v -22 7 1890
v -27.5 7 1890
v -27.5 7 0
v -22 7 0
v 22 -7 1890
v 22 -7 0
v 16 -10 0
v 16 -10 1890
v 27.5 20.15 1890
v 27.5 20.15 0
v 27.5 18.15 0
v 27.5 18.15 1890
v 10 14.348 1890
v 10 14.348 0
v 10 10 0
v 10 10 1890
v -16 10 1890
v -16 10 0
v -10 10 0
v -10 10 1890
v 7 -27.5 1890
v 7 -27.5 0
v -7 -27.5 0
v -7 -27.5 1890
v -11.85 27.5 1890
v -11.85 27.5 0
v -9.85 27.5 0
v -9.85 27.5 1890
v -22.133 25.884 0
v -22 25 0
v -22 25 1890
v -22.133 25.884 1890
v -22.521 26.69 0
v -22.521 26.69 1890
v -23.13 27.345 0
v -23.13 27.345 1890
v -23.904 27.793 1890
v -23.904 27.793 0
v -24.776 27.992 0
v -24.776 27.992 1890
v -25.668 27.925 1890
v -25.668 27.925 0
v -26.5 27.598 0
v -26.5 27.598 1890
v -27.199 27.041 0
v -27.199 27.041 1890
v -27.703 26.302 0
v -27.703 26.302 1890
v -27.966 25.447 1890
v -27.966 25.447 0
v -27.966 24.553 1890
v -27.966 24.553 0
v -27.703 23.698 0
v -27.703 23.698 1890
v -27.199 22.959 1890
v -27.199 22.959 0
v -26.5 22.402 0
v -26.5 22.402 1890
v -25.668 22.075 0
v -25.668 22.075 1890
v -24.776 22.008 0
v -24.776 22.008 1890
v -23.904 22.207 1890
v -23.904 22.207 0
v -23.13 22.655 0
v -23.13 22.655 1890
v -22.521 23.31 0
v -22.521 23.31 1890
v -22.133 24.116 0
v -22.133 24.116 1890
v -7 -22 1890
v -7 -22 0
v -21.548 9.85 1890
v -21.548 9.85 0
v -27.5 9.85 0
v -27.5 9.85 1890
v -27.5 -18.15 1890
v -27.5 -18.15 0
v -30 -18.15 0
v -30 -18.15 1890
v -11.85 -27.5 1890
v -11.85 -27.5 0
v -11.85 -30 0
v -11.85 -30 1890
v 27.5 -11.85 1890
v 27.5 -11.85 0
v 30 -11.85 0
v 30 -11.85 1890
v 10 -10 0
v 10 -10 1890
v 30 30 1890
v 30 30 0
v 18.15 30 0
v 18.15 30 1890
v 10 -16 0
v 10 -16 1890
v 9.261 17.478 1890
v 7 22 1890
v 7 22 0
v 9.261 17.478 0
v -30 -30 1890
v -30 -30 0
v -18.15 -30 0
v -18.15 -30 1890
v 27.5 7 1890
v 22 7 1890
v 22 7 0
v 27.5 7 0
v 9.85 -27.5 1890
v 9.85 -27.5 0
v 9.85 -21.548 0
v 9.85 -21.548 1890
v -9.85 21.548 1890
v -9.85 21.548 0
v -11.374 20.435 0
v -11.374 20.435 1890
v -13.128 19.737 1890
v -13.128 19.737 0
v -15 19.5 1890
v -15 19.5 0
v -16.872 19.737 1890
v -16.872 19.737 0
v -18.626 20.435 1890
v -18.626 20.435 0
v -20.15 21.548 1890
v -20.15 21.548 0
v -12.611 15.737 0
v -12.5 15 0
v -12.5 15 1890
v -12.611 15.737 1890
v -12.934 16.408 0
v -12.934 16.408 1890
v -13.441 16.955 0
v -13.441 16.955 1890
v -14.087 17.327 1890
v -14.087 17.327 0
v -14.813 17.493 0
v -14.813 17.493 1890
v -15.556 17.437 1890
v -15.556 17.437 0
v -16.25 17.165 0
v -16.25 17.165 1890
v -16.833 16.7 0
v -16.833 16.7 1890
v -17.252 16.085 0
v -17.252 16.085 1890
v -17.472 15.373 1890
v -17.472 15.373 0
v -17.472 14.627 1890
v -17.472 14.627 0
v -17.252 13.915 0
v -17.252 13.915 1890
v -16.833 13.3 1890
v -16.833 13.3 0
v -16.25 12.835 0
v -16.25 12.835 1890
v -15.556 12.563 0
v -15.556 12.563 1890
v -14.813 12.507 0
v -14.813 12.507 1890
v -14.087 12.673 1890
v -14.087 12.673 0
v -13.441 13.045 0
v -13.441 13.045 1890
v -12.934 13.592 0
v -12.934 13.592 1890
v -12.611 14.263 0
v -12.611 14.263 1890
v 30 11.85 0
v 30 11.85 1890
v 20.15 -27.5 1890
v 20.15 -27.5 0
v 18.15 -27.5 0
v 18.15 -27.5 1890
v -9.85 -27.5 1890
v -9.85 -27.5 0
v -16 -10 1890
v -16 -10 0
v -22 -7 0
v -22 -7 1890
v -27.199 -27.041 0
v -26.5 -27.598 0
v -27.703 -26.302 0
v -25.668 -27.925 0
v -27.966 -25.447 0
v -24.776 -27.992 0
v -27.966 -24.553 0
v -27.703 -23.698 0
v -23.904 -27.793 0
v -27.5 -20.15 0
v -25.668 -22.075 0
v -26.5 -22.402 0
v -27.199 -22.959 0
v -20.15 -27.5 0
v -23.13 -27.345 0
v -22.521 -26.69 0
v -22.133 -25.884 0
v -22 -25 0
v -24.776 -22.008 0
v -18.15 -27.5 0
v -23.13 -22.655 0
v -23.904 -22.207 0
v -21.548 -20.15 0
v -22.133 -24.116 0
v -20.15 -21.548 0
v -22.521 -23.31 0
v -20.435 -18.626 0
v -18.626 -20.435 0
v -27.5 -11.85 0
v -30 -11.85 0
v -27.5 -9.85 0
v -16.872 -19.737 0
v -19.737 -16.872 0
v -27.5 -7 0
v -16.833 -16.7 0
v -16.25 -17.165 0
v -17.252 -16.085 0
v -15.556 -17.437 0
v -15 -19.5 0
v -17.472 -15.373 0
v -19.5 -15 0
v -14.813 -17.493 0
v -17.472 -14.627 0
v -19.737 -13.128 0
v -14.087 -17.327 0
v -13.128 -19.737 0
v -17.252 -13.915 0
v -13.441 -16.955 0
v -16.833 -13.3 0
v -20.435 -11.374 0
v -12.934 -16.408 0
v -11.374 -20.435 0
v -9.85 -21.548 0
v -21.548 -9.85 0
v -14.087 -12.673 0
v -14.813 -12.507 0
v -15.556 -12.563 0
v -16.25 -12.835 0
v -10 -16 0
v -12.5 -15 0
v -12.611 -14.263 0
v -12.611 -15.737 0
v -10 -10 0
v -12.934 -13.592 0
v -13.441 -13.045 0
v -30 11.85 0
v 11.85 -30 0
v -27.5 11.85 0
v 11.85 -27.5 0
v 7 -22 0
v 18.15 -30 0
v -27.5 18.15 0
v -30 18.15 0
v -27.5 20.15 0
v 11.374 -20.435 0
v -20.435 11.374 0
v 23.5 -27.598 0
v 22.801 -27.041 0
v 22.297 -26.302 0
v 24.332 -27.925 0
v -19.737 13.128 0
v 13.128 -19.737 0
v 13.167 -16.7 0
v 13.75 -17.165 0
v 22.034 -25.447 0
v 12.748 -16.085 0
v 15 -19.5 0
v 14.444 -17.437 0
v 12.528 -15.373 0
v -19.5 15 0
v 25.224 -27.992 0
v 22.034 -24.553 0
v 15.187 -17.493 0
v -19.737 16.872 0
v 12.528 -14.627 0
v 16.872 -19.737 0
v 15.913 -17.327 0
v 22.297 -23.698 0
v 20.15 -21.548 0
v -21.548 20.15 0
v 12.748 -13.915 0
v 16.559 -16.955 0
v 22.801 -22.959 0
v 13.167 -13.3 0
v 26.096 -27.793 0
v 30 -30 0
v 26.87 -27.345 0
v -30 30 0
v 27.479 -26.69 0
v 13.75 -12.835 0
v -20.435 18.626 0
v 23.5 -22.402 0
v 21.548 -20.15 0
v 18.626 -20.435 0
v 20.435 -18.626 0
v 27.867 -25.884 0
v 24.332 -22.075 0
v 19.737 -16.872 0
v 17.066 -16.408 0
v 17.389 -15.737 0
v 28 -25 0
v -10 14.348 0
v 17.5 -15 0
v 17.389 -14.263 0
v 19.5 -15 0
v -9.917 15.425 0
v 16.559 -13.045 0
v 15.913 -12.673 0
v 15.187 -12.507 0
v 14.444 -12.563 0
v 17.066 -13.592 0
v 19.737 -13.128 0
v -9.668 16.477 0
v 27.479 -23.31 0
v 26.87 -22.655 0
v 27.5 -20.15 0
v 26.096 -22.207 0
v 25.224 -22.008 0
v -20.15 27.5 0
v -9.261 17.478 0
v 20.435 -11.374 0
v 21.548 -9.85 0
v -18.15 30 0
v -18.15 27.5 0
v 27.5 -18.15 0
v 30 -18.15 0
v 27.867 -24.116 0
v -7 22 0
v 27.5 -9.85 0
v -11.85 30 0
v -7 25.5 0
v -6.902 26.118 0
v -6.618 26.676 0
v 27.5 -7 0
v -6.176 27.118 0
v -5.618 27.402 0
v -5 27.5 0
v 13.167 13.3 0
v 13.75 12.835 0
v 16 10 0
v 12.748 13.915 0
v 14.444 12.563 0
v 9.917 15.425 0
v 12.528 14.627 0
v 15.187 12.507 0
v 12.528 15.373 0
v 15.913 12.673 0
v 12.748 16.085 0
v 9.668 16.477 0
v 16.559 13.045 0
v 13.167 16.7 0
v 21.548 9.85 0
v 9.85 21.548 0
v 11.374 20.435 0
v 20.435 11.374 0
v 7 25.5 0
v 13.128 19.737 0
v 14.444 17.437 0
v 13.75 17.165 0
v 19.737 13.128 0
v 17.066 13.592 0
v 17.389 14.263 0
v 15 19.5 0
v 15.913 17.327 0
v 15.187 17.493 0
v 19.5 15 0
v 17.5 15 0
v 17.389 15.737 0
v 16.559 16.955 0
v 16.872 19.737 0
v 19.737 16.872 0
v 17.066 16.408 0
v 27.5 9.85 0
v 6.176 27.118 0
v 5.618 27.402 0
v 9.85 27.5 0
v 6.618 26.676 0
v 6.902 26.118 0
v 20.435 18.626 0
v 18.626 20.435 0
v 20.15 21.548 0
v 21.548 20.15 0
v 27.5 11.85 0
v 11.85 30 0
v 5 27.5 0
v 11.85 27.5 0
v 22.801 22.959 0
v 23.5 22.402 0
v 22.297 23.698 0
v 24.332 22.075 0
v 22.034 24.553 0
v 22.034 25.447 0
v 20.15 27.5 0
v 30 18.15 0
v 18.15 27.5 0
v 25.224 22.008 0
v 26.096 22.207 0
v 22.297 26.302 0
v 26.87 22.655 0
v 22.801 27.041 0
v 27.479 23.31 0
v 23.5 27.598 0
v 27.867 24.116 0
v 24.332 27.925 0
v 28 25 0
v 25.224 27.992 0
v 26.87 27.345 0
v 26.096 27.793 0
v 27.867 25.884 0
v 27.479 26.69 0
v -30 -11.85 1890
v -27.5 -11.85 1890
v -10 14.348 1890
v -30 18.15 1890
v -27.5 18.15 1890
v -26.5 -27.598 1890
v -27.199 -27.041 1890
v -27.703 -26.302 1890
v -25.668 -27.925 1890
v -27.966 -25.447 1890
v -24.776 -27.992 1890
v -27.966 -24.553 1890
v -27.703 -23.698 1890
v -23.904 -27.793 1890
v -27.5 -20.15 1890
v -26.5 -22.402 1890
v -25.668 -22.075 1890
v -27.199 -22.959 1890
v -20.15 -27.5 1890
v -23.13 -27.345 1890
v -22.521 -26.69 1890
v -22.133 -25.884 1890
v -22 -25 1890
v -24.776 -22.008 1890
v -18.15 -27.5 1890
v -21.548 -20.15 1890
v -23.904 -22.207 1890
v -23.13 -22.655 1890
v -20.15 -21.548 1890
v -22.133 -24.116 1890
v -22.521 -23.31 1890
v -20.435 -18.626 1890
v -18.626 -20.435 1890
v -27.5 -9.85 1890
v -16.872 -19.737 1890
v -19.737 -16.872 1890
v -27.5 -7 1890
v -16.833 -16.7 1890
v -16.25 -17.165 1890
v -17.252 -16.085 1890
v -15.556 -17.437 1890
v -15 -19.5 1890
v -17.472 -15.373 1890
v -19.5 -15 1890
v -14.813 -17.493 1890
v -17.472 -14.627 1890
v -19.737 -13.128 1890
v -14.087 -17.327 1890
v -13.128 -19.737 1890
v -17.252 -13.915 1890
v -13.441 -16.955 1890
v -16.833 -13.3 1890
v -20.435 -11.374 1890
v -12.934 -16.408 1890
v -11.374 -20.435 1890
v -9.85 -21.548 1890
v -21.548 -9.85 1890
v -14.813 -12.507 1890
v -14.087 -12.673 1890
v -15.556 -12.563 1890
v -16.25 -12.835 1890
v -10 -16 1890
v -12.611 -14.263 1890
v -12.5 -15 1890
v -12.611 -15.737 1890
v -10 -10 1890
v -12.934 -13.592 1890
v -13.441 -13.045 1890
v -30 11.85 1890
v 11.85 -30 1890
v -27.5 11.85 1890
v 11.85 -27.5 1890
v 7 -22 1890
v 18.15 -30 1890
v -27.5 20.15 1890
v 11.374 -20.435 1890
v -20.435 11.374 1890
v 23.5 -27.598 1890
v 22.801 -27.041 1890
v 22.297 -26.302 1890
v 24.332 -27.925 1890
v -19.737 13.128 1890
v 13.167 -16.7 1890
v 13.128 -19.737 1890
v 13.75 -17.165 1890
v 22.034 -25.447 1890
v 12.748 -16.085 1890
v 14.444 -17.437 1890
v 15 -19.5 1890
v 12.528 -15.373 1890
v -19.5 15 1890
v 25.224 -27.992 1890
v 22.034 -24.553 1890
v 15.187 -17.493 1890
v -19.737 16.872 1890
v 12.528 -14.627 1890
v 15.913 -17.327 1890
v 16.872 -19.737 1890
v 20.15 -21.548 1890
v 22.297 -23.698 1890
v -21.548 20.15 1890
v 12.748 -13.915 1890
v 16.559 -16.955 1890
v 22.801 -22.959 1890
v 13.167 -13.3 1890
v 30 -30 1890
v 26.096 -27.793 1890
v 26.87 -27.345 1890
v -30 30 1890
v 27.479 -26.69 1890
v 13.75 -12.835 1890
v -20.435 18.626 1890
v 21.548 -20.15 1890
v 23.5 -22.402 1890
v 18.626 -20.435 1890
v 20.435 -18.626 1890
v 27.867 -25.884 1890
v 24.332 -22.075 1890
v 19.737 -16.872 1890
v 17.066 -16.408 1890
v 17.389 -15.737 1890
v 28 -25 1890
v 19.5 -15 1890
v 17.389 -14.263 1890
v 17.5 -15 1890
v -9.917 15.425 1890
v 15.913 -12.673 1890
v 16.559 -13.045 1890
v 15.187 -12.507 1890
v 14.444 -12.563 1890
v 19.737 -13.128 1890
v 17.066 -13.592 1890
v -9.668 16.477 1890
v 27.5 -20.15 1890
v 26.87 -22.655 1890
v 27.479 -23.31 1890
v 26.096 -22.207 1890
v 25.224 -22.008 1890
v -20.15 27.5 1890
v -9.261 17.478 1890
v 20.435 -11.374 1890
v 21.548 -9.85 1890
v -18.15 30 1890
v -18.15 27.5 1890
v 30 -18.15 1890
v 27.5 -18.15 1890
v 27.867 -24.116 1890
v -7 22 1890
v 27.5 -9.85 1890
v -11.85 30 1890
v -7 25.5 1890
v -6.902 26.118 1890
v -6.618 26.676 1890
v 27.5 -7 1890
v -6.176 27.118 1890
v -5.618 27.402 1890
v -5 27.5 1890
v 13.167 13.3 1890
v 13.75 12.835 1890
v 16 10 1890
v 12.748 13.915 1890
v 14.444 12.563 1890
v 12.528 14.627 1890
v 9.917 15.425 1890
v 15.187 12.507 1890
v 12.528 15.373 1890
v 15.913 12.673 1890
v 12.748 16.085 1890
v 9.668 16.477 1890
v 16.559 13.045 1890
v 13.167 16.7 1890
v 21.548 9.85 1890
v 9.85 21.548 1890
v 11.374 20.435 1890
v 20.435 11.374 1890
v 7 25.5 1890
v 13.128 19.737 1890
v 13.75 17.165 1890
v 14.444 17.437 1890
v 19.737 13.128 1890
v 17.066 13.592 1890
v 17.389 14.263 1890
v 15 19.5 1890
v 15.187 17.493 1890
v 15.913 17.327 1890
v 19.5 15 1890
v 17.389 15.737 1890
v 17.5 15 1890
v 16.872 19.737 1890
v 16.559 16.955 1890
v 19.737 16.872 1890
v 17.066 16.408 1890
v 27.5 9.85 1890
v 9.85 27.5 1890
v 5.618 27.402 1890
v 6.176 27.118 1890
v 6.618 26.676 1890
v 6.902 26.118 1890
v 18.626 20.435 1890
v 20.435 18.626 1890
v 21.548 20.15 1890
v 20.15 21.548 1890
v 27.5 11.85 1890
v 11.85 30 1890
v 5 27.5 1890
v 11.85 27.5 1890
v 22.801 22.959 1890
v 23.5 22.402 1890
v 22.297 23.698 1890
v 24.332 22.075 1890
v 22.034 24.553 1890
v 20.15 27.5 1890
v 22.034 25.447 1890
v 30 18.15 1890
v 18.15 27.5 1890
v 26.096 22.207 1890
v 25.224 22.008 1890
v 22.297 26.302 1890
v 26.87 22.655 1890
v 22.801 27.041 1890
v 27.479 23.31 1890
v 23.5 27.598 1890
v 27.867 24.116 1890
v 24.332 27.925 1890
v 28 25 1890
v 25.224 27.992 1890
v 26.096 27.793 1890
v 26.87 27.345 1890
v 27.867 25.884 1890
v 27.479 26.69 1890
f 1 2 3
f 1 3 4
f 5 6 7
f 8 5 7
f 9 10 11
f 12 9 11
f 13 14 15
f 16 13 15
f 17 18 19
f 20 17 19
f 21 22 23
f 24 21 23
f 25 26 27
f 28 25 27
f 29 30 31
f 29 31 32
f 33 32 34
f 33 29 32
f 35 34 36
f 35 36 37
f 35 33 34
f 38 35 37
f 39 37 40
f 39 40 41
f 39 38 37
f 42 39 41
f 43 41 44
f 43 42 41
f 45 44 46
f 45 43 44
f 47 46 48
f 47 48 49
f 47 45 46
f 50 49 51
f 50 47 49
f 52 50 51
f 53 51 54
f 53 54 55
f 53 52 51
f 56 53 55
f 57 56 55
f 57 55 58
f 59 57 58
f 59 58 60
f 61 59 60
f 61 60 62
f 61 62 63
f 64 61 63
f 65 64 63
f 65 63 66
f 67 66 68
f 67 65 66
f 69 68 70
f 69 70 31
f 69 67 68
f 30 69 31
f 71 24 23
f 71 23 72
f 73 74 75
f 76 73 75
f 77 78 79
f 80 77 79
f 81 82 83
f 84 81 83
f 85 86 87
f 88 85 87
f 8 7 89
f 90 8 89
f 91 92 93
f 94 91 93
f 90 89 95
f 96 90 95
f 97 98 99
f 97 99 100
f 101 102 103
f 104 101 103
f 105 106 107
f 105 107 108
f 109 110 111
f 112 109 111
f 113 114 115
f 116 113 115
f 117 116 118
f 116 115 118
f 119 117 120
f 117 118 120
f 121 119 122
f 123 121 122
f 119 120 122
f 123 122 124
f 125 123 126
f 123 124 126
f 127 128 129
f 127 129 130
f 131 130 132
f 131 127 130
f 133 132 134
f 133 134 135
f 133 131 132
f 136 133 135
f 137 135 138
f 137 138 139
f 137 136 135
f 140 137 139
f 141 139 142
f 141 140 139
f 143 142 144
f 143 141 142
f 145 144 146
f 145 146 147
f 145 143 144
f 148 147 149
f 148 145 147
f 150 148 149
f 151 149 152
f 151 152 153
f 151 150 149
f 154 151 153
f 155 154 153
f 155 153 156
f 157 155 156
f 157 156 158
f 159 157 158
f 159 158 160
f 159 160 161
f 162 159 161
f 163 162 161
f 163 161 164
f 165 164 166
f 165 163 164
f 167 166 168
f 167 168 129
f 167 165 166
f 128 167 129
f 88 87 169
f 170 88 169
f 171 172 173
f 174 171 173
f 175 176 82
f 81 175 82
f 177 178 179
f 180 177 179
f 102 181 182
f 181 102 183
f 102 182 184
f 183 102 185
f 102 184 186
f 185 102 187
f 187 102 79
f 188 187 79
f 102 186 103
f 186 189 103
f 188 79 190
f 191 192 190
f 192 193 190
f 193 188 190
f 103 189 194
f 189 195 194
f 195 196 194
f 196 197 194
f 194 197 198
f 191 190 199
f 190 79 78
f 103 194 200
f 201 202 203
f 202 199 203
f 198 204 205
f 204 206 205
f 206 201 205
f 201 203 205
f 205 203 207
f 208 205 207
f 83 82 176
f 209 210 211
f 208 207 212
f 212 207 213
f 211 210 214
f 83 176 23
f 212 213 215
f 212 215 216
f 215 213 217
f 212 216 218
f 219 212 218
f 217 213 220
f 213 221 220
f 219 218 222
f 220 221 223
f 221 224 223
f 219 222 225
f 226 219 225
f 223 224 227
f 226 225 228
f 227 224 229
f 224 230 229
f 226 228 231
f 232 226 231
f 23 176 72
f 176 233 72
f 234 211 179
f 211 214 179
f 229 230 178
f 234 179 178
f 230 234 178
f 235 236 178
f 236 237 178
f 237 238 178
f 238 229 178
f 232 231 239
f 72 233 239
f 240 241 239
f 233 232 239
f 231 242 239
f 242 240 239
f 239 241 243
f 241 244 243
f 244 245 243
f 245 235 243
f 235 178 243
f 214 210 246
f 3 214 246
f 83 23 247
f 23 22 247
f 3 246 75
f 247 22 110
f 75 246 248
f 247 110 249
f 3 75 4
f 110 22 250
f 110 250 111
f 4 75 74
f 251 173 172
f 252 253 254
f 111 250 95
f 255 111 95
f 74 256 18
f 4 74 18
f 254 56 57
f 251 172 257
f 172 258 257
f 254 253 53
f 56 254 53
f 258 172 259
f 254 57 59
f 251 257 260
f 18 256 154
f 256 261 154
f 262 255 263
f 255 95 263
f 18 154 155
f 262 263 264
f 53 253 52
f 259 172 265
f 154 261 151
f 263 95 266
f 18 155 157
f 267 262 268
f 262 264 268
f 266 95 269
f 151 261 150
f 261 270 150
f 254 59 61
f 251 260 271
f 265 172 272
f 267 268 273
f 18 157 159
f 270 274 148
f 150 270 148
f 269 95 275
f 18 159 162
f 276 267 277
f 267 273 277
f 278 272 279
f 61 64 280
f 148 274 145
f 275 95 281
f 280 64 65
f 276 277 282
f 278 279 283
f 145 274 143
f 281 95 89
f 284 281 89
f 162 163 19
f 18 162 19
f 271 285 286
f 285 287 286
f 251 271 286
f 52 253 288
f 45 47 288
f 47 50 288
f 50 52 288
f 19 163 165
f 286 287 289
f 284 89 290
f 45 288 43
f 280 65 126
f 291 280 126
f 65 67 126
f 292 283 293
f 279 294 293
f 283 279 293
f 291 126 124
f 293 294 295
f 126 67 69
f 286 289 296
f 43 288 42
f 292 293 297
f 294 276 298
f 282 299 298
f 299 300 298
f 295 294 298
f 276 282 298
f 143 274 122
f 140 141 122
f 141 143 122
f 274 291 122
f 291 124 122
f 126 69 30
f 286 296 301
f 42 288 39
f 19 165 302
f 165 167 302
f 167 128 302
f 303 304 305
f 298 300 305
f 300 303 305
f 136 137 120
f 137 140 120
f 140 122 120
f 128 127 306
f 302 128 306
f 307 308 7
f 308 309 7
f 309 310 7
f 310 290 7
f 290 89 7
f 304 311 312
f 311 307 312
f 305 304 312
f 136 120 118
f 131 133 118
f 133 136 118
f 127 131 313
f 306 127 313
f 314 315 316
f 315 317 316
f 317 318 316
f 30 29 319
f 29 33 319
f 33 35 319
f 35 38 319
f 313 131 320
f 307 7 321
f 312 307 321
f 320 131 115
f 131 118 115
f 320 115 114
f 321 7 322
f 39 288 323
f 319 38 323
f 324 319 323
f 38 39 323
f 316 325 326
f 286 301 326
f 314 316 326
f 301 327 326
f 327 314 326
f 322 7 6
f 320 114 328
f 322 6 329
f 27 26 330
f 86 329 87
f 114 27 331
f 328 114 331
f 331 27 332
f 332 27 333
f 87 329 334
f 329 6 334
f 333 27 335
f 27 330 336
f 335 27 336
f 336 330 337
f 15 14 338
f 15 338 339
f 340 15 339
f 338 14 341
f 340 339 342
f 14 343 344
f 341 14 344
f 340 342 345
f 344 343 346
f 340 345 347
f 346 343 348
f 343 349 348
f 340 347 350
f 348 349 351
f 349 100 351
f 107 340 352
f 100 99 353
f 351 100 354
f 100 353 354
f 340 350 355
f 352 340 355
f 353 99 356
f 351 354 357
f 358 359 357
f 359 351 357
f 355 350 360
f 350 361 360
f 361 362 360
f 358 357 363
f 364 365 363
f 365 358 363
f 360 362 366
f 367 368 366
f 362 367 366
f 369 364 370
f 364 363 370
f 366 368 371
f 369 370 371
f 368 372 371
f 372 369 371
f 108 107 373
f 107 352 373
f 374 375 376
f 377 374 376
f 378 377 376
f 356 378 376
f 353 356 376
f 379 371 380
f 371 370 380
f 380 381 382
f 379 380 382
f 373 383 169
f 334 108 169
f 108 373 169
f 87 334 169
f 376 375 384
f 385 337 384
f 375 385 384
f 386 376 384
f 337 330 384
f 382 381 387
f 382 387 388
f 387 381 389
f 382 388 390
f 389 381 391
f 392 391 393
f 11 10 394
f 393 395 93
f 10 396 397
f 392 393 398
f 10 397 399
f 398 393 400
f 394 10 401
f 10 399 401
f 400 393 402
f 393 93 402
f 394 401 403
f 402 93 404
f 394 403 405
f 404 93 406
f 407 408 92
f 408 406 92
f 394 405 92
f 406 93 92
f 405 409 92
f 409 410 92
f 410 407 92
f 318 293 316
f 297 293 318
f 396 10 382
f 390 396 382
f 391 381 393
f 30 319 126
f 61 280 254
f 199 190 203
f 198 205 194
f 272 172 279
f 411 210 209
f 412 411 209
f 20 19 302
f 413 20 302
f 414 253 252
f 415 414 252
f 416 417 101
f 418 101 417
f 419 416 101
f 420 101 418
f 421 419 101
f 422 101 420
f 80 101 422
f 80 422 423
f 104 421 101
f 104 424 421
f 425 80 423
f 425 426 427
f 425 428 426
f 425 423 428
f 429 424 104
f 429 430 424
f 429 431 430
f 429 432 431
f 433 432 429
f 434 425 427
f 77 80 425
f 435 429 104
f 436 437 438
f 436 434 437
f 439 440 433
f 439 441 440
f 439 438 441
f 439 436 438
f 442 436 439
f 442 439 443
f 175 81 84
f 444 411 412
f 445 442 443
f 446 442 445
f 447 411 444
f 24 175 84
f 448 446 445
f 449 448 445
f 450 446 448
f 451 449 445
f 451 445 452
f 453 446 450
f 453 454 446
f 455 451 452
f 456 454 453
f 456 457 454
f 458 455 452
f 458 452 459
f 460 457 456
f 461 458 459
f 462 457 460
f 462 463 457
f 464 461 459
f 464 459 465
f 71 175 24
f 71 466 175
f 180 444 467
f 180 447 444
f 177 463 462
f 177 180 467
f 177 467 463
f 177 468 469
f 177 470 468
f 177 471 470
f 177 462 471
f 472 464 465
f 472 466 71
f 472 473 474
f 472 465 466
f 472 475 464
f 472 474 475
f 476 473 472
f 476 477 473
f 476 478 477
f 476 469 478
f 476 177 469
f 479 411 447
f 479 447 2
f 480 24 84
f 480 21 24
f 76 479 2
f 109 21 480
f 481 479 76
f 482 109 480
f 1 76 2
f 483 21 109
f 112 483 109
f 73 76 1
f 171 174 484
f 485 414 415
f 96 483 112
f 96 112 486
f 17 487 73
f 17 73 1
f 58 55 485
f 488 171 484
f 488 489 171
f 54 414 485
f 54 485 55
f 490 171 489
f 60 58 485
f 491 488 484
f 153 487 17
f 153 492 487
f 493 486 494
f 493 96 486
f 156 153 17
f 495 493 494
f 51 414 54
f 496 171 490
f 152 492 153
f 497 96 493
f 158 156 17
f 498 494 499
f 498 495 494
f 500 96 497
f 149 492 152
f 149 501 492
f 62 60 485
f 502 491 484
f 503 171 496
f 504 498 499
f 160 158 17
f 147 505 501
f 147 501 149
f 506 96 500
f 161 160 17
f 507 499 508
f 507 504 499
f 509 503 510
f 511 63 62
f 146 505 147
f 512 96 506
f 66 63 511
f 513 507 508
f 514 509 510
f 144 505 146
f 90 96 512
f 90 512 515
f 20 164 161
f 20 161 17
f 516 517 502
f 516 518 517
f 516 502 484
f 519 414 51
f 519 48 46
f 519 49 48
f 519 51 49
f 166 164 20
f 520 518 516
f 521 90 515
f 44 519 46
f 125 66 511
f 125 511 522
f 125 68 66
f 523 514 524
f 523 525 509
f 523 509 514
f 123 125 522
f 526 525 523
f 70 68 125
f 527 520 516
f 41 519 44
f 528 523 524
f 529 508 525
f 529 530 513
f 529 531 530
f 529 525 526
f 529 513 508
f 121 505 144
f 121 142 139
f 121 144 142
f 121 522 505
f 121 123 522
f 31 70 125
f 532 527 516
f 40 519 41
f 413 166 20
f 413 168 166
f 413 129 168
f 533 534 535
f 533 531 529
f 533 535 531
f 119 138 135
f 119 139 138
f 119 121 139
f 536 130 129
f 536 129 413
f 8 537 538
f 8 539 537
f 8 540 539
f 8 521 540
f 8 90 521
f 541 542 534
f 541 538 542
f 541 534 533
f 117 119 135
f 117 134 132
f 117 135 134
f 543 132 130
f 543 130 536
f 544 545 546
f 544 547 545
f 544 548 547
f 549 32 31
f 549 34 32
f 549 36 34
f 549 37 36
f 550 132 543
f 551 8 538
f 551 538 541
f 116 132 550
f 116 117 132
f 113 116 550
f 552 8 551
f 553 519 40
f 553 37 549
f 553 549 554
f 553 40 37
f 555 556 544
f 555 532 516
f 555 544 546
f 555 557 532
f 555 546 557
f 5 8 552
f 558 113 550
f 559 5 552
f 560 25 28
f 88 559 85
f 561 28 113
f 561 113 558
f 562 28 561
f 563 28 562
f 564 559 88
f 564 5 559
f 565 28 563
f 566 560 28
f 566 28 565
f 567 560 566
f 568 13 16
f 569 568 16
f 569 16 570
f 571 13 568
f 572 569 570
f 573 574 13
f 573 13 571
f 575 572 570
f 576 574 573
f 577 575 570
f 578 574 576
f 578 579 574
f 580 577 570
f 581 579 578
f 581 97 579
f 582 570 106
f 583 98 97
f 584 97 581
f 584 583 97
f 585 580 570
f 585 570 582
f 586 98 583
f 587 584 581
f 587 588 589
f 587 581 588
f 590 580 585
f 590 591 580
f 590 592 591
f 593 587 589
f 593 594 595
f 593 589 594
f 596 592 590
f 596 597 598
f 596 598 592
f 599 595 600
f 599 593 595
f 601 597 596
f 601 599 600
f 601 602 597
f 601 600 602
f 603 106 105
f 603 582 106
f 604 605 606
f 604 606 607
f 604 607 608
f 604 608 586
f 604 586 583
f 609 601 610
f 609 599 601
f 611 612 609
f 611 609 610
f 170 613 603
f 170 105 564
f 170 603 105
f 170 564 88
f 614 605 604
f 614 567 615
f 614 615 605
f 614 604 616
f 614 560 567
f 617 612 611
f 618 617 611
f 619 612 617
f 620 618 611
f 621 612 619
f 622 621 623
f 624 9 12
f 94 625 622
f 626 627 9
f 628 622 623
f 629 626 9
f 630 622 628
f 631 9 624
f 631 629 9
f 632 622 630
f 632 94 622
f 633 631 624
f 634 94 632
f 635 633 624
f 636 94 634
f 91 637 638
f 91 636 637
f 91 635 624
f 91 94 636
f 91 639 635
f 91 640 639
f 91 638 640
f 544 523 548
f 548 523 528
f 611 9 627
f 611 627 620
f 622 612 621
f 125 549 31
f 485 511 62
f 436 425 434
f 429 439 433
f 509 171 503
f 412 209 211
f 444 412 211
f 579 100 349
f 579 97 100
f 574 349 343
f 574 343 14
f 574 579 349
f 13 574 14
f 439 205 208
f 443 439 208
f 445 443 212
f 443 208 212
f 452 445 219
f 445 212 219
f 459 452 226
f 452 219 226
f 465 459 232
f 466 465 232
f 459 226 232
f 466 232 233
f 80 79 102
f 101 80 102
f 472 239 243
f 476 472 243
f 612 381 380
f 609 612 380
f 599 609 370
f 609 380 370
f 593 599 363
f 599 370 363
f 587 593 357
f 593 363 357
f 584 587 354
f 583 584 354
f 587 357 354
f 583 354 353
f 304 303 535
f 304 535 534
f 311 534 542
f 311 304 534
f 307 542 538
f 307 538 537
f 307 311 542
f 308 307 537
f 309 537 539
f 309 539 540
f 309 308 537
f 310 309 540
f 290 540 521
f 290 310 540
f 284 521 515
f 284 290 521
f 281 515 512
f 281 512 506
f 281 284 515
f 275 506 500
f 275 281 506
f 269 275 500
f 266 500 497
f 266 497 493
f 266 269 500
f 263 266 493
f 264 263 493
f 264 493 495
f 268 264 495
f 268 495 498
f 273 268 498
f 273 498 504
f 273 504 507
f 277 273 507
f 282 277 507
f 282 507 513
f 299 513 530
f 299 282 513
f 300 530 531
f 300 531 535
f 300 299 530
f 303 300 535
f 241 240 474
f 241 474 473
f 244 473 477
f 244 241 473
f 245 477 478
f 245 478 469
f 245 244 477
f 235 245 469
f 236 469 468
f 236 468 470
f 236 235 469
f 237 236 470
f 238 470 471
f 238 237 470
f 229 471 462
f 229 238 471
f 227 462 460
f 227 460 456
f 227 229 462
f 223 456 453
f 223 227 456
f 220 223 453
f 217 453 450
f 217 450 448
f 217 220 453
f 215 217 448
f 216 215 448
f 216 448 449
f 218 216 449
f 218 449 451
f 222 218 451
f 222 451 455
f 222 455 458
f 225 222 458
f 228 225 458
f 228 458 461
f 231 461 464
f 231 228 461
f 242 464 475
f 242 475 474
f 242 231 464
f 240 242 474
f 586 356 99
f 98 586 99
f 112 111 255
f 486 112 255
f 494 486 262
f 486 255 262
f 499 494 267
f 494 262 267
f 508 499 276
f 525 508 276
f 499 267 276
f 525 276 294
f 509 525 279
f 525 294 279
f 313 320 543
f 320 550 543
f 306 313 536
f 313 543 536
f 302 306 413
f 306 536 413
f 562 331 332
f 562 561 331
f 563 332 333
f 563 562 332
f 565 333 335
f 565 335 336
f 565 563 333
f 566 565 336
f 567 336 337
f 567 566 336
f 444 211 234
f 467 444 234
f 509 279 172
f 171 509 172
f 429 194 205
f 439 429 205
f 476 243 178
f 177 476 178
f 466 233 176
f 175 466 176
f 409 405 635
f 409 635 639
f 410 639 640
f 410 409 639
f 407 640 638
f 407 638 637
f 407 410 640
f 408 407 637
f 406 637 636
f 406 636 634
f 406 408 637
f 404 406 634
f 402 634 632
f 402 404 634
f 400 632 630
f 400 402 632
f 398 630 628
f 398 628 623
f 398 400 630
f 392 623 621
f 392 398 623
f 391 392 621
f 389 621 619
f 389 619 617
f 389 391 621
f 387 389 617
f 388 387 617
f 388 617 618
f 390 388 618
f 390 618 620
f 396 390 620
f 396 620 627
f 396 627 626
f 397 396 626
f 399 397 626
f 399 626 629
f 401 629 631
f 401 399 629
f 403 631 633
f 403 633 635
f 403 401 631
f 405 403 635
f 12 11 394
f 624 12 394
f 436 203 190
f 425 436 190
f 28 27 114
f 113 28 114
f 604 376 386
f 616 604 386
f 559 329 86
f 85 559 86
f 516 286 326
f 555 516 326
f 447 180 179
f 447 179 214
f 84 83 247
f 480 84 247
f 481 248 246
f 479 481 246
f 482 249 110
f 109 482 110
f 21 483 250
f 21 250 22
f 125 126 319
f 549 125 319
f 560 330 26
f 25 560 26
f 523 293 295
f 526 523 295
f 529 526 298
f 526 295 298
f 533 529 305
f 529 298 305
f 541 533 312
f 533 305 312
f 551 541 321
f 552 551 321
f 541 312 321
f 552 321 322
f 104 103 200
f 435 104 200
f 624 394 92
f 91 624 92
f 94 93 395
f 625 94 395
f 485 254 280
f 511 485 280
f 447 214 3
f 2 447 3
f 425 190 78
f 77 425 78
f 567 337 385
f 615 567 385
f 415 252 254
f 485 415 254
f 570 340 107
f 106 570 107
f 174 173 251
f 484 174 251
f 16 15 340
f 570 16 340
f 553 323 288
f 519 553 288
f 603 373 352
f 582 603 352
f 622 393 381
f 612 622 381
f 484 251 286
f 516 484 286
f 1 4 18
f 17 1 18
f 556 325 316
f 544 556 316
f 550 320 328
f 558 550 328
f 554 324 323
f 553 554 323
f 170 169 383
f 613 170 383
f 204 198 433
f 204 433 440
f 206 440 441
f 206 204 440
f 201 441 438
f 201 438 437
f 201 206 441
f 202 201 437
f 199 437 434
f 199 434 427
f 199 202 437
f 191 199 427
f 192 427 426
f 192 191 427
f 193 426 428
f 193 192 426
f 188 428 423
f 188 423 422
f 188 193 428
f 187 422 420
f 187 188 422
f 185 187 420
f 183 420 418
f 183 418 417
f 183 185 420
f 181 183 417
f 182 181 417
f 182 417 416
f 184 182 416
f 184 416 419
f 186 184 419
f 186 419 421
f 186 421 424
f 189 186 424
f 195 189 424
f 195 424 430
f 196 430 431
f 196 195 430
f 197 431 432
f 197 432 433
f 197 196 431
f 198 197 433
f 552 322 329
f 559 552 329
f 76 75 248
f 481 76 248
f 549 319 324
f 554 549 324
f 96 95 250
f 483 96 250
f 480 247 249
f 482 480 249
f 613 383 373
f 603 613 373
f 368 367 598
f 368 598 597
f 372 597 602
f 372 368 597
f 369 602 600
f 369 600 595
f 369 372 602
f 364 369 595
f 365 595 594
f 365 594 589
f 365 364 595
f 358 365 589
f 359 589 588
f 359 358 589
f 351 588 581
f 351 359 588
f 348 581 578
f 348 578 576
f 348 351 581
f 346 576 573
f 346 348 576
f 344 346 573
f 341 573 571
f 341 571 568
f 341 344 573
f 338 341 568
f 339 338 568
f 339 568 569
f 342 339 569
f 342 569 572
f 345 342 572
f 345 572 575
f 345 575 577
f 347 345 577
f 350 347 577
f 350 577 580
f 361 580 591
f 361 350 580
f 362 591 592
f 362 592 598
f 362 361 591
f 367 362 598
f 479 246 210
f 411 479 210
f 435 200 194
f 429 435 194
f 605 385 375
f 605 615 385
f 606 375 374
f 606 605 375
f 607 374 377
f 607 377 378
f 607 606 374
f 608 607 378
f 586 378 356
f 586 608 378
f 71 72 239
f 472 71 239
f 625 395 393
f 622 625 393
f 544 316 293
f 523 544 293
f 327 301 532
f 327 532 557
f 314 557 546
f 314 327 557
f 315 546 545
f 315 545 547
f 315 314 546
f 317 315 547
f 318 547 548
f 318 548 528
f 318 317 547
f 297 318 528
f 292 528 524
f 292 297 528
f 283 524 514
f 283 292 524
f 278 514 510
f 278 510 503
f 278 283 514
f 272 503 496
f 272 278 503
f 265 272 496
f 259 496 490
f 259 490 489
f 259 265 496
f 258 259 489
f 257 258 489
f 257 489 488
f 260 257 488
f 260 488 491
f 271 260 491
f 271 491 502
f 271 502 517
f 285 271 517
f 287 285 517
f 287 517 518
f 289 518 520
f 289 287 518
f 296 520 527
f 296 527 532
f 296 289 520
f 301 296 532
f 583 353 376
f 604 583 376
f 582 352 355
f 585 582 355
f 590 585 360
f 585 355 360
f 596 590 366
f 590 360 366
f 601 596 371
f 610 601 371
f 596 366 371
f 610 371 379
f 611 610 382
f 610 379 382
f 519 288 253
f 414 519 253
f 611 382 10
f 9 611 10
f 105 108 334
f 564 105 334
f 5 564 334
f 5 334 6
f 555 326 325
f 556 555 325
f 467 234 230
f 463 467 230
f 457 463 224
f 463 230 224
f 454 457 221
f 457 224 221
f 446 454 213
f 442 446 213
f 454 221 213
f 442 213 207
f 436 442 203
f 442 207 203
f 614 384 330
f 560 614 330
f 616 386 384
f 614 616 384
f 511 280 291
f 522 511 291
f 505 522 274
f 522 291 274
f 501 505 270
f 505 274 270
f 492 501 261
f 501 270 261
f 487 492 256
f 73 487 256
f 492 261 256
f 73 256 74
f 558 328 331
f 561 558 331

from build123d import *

# Parameters (mm, degrees)
F0_R     = 3
F0_R_2   = 2.5
F1_DEPTH = 1890
F2_R     = 2
F3_R     = 7


# Not quite as in the source:
# - a feature names something its author has since deleted; it is built from what else it names


with BuildPart() as f1:
    # F0 (on Top) → F1 (new body)
    with BuildSketch(Plane.XY):
        with BuildLine():
            Line((18.15, -30), (30, -30))
            Line((30, -30), (30, -18.15))
            Line((30, -18.15), (27.5, -18.15))
            Line((27.5, -18.15), (27.5, -20.15))
            Line((27.5, -20.15), (21.5477069044, -20.15))
            ThreePointArc((21.5477069044, -20.15), (19.5, -15), (21.5477069044, -9.85))
            Line((21.5477069044, -9.85), (27.5, -9.85))
            Line((27.5, -9.85), (27.5, -11.85))
            Line((27.5, -11.85), (30, -11.85))
            Line((30, -11.85), (30, 11.85))
            Line((30, 11.85), (27.5, 11.85))
            Line((27.5, 11.85), (27.5, 9.85))
            Line((27.5, 9.85), (21.5477069044, 9.85))
            ThreePointArc((21.5477069044, 9.85), (19.5, 15), (21.5477069044, 20.15))
            Line((21.5477069044, 20.15), (27.5, 20.15))
            Line((27.5, 20.15), (27.5, 18.15))
            Line((27.5, 18.15), (30, 18.15))
            Line((30, 18.15), (30, 30))
            Line((30, 30), (18.15, 30))
            Line((18.15, 30), (18.15, 27.5))
            Line((18.15, 27.5), (20.15, 27.5))
            Line((20.15, 27.5), (20.15, 21.5477069044))
            ThreePointArc((20.15, 21.5477069044), (15, 19.5), (9.85, 21.5477069044))
            Line((9.85, 21.5477069044), (9.85, 27.5))
            Line((9.85, 27.5), (11.85, 27.5))
            Line((11.85, 27.5), (11.85, 30))
            Line((11.85, 30), (-11.85, 30))
            Line((-11.85, 30), (-11.85, 27.5))
            Line((-11.85, 27.5), (-9.85, 27.5))
            Line((-9.85, 27.5), (-9.85, 21.5477069044))
            ThreePointArc((-9.85, 21.5477069044), (-15, 19.5), (-20.15, 21.5477069044))
            Line((-20.15, 21.5477069044), (-20.15, 27.5))
            Line((-20.15, 27.5), (-18.15, 27.5))
            Line((-18.15, 27.5), (-18.15, 30))
            Line((-18.15, 30), (-30, 30))
            Line((-30, 30), (-30, 18.15))
            Line((-30, 18.15), (-27.5, 18.15))
            Line((-27.5, 18.15), (-27.5, 20.15))
            Line((-27.5, 20.15), (-21.5477069044, 20.15))
            ThreePointArc((-21.5477069044, 20.15), (-19.5, 15), (-21.5477069044, 9.85))
            Line((-21.5477069044, 9.85), (-27.5, 9.85))
            Line((-27.5, 9.85), (-27.5, 11.85))
            Line((-27.5, 11.85), (-30, 11.85))
            Line((-30, 11.85), (-30, -11.85))
            Line((-30, -11.85), (-27.5, -11.85))
            Line((-27.5, -11.85), (-27.5, -9.85))
            Line((-27.5, -9.85), (-21.5477069044, -9.85))
            ThreePointArc((-21.5477069044, -9.85), (-19.5, -15), (-21.5477069044, -20.15))
            Line((-21.5477069044, -20.15), (-27.5, -20.15))
            Line((-27.5, -20.15), (-27.5, -18.15))
            Line((-27.5, -18.15), (-30, -18.15))
            Line((-30, -18.15), (-30, -30))
            Line((-30, -30), (-18.15, -30))
            Line((-18.15, -30), (-18.15, -27.5))
            Line((-18.15, -27.5), (-20.15, -27.5))
            Line((-20.15, -27.5), (-20.15, -21.5477069044))
            ThreePointArc((-20.15, -21.5477069044), (-15, -19.5), (-9.85, -21.5477069044))
            Line((-9.85, -21.5477069044), (-9.85, -27.5))
            Line((-9.85, -27.5), (-11.85, -27.5))
            Line((-11.85, -27.5), (-11.85, -30))
            Line((-11.85, -30), (11.85, -30))
            Line((11.85, -30), (11.85, -27.5))
            Line((11.85, -27.5), (9.85, -27.5))
            Line((9.85, -27.5), (9.85, -21.5477069044))
            ThreePointArc((9.85, -21.5477069044), (15, -19.5), (20.15, -21.5477069044))
            Line((20.15, -21.5477069044), (20.15, -27.5))
            Line((20.15, -27.5), (18.15, -27.5))
            Line((18.15, -27.5), (18.15, -30))
        make_face()
        with Locations((-25, -25)):
            Circle(F0_R, mode=Mode.SUBTRACT)
        with Locations((-15, -15)):
            Circle(F0_R_2, mode=Mode.SUBTRACT)
        with Locations((25, -25)):
            Circle(F0_R, mode=Mode.SUBTRACT)
        with Locations((15, -15)):
            Circle(F0_R_2, mode=Mode.SUBTRACT)
        with Locations((-25, 25)):
            Circle(F0_R, mode=Mode.SUBTRACT)
        with Locations((-15, 15)):
            Circle(F0_R_2, mode=Mode.SUBTRACT)
        Polygon((-7, 22), (-7, 27.5), (0, 27.5), (7, 27.5), (7, 22), (10, 16), (10, 10), (16, 10), (22, 7), (27.5, 7), (27.5, 0), (27.5, -7), (22, -7), (16, -10), (10, -10), (10, -16), (7, -22), (7, -27.5), (0, -27.5), (-7, -27.5), (-7, -22), (-10, -16), (-10, -10), (-16, -10), (-22, -7), (-27.5, -7), (-27.5, 0), (-27.5, 7), (-22, 7), (-16, 10), (-10, 10), (-10, 16), align=None, mode=Mode.SUBTRACT)
        with Locations((15, 15)):
            Circle(F0_R_2, mode=Mode.SUBTRACT)
        with Locations((25, 25)):
            Circle(F0_R, mode=Mode.SUBTRACT)
    extrude(amount=F1_DEPTH)

    # F2
    f2_edges = [f1.edges().sort_by_distance(p)[0] for p in [
        (-7, 27.5, 945),
        (7, 27.5, 945),
    ]]
    fillet(f2_edges, radius=F2_R)

    # F3
    f3_edges = [f1.edges().sort_by_distance(p)[0] for p in [
        (-10, 16, 945),
        (10, 16, 945),
    ]]
    fillet(f3_edges, radius=F3_R)


solid = f1.part
